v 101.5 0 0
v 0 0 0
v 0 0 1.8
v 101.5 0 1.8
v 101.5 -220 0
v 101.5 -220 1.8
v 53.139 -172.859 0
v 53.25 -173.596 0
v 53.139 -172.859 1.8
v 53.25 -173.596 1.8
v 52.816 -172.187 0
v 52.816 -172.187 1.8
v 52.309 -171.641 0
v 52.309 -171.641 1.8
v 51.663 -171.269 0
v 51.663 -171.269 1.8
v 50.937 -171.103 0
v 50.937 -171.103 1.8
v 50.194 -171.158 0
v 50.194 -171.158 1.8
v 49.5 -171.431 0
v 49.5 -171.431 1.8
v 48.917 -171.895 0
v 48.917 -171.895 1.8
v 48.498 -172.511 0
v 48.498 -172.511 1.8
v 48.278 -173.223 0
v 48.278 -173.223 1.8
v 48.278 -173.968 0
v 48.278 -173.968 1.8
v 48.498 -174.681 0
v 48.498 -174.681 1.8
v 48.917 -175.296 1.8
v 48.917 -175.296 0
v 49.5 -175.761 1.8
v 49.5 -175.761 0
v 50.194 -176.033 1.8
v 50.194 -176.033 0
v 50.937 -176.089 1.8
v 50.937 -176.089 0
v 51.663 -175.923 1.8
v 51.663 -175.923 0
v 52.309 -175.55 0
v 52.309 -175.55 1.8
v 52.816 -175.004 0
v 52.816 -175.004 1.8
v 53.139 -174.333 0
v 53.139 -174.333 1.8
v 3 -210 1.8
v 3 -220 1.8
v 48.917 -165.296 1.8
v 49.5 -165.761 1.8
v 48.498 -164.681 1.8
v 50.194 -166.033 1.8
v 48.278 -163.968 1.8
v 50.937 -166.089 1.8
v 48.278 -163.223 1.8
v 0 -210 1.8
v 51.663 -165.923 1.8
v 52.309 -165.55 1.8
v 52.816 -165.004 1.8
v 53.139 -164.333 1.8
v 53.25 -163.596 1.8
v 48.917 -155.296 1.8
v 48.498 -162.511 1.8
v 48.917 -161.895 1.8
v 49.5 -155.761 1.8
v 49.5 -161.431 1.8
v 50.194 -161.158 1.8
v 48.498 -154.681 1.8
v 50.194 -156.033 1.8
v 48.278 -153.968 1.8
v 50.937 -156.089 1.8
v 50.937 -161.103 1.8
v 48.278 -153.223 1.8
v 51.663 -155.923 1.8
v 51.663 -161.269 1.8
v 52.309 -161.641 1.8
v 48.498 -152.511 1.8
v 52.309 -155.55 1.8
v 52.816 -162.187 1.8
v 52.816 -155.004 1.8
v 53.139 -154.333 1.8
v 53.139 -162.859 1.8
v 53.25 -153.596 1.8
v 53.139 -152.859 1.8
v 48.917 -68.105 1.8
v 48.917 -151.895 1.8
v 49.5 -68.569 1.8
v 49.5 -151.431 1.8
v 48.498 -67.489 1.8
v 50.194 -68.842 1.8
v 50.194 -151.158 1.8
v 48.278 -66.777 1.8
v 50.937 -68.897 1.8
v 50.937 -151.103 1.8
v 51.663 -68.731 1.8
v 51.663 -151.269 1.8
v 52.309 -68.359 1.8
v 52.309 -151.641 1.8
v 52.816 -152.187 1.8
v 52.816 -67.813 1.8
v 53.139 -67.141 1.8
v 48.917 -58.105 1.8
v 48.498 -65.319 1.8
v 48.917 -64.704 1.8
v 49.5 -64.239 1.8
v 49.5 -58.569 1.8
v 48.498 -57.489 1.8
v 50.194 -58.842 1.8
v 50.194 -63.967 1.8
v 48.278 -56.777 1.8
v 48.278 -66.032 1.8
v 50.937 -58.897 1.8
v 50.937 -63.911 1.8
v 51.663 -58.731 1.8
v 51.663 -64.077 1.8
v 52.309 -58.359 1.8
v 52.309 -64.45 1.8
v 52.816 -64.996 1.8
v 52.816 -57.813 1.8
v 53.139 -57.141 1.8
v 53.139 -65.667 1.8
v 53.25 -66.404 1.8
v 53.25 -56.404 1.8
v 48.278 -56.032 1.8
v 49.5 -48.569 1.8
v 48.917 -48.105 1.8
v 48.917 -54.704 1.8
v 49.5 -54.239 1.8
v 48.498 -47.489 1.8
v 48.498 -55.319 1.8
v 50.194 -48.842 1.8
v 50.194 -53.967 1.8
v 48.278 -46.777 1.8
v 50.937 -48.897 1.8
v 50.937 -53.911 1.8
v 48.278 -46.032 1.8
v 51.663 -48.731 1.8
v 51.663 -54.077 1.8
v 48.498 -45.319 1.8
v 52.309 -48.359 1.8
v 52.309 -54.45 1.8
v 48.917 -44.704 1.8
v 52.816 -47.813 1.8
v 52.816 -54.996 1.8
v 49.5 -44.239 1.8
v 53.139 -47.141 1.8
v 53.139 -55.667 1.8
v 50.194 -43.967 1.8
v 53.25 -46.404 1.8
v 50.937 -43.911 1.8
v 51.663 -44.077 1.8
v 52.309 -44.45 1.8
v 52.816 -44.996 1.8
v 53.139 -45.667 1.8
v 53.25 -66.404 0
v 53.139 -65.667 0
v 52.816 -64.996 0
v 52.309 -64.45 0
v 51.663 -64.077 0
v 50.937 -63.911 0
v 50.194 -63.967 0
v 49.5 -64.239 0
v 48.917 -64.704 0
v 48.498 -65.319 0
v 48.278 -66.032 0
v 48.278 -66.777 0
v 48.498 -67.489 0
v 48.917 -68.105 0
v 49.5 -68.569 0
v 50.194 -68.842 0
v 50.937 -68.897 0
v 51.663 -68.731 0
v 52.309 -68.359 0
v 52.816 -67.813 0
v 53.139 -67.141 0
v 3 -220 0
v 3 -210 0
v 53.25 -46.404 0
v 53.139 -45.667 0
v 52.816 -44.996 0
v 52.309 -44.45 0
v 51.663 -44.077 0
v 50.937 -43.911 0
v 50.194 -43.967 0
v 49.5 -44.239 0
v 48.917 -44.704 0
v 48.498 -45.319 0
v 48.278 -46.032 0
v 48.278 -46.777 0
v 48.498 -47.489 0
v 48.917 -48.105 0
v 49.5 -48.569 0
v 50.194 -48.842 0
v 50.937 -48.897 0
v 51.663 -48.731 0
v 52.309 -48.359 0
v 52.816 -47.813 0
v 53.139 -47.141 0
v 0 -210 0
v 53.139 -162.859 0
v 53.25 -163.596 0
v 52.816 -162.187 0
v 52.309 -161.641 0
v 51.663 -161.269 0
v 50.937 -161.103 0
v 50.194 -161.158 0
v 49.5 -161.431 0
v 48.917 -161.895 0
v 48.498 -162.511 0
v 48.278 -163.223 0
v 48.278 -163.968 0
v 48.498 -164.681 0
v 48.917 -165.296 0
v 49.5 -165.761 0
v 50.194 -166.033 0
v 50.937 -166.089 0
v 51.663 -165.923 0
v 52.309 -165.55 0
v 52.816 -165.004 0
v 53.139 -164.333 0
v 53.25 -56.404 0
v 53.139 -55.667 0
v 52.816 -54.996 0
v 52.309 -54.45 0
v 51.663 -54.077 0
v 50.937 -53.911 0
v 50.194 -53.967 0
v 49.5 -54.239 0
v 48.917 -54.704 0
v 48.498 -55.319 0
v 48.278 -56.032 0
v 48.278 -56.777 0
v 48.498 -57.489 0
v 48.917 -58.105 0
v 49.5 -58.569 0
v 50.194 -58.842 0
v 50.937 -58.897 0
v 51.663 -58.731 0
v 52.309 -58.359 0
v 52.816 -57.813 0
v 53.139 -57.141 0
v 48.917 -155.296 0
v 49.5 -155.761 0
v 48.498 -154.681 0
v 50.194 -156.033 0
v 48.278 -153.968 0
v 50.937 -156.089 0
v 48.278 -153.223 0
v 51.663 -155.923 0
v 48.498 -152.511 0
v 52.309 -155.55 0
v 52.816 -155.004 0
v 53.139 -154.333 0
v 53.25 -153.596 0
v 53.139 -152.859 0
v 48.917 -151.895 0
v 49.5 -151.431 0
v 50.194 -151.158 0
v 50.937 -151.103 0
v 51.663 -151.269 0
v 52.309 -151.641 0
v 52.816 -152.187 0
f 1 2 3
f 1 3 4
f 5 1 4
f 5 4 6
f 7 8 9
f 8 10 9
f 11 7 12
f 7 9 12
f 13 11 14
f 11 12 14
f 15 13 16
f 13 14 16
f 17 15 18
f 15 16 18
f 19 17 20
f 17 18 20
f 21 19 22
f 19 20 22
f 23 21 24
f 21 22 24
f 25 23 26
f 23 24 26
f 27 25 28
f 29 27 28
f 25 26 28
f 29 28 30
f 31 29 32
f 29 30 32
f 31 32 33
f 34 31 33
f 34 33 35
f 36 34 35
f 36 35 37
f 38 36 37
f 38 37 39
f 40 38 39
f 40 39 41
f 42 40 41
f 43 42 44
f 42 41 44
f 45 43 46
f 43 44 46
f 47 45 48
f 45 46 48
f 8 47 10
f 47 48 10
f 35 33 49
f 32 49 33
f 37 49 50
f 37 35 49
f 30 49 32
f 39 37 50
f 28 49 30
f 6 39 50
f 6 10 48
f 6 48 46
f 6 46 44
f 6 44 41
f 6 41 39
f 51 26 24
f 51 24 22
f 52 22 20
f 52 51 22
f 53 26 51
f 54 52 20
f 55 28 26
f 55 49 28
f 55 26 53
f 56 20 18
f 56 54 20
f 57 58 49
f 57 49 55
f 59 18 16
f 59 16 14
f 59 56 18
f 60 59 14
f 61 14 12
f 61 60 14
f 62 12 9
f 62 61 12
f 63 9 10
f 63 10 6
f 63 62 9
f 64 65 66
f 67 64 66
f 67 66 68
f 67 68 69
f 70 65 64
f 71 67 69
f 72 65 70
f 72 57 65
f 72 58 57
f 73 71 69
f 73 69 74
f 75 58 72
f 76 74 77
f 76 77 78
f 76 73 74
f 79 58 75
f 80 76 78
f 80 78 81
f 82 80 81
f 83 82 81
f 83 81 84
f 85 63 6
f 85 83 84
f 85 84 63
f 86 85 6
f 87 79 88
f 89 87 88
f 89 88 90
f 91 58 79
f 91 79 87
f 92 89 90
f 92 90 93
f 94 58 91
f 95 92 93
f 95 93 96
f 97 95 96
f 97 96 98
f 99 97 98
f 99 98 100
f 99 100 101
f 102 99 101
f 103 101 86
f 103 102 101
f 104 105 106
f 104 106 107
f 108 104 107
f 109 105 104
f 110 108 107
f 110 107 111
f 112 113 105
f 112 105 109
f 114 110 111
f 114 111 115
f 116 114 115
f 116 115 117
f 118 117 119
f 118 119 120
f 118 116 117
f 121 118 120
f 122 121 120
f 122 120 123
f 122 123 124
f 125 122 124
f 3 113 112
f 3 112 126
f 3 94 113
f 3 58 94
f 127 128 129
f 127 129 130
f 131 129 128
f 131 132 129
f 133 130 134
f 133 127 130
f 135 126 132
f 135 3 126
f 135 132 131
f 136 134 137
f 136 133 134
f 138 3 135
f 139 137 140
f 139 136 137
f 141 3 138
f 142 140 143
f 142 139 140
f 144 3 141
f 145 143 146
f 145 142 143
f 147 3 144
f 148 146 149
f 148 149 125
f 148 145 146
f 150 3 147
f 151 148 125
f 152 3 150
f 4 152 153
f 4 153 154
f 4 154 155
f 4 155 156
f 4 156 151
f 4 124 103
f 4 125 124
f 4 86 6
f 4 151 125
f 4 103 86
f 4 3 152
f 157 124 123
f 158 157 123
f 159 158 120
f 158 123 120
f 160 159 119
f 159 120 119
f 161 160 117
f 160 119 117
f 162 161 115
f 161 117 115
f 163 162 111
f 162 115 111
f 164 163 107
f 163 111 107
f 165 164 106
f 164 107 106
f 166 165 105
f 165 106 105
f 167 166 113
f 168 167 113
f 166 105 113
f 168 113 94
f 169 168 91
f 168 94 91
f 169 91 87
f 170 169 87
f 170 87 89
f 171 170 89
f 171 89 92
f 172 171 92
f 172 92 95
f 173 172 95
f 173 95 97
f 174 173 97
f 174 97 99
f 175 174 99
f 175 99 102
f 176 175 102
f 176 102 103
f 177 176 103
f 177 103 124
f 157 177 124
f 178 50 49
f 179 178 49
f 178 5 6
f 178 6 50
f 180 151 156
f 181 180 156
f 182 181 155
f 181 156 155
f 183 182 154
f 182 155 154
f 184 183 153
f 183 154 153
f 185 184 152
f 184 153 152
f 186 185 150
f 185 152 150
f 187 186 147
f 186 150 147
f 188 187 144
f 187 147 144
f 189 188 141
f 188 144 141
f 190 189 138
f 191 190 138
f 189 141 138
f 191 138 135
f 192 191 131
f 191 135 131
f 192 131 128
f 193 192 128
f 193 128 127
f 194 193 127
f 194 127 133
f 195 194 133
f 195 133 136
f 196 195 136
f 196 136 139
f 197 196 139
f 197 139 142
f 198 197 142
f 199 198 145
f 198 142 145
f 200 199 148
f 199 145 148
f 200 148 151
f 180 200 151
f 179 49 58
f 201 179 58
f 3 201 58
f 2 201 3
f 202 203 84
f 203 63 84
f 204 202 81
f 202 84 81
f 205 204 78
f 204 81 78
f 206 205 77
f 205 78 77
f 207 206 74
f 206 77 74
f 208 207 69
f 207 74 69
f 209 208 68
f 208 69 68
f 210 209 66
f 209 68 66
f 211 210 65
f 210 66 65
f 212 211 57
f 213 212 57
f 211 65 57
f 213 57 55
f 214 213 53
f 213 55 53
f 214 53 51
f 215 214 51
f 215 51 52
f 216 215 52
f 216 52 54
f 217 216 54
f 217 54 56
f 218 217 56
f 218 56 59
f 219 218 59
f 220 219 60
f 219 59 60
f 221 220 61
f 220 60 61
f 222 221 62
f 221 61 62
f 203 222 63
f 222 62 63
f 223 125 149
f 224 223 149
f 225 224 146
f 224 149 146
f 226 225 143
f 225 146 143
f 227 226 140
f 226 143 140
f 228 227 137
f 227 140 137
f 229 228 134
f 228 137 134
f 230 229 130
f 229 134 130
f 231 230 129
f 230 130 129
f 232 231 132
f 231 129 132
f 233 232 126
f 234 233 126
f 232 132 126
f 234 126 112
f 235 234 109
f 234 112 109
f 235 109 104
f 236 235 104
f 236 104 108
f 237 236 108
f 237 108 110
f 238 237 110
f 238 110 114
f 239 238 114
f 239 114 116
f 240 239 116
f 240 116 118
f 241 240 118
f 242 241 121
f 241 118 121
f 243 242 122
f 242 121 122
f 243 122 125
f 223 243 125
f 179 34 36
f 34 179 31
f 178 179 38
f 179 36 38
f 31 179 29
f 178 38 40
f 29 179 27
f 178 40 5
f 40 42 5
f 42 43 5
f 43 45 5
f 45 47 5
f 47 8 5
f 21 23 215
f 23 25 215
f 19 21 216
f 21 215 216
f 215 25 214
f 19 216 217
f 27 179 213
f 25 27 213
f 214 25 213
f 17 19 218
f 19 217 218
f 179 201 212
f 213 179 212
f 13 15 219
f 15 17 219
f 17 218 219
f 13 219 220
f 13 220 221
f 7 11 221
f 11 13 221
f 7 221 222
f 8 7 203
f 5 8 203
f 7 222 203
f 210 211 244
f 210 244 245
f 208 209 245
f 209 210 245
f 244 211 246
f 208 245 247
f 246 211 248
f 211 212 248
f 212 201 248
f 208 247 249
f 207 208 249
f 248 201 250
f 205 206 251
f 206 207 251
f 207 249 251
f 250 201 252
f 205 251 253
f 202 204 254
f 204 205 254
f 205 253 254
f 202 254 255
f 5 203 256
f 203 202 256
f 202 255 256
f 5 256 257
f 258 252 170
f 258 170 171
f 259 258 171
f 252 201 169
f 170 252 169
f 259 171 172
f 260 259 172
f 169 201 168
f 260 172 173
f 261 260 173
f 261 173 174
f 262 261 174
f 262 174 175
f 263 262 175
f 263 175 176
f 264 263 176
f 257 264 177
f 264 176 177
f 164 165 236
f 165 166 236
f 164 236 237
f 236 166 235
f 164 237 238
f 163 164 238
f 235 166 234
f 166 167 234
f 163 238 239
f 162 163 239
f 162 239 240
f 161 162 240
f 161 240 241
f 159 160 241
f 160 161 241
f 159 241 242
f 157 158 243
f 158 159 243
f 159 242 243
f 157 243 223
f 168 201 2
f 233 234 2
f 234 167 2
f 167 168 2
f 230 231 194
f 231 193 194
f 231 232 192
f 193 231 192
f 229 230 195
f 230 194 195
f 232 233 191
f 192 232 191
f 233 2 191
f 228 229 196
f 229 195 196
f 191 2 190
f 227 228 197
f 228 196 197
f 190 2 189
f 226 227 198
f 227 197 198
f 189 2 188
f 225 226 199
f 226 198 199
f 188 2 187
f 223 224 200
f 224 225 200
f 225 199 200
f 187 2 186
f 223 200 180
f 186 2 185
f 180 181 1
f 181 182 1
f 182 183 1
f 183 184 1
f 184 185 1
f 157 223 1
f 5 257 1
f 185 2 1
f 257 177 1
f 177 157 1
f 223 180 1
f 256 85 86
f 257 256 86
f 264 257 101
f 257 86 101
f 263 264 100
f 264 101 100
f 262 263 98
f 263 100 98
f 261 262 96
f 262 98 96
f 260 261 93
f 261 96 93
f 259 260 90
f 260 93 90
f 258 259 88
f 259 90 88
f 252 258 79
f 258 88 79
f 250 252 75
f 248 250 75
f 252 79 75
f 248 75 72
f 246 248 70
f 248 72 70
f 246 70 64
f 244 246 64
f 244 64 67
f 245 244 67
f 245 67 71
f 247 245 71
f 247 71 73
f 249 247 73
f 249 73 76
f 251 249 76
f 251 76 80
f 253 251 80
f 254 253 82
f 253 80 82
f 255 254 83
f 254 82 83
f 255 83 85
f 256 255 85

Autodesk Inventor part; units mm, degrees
ref_plane "YZ Plane" through (0, 0, 0) normal (1, 0, 0) x (0, 1, 0)
ref_plane "XZ Plane" through (0, 0, 0) normal (0, 1, 0) x (-1, 0, 0)
ref_plane "XY Plane" through (0, 0, 0) normal (0, 0, 1) x (1, 0, 0)
sketch "Sketch1" plane through (0, 0, 0) normal (0, 0, 1) x (1, 0, 0)
  line L0 (0, 0) -> (101.5, 0)
  line L1 (101.5, 0) -> (101.5, -220)
  line L2 (101.5, -220) -> (0, -220)
  line L3 (0, -220) -> (0, 0)
  dimension "d0" = 101.5
  dimension "d1" = 220
extrude "Extrusion1" add sketch "Sketch1" along normal blind 1.8
sketch "Sketch2" plane through (0, 0, 1.8) normal (0, 0, 1) x (1, 0, 0)
  line L0 (0, 0) -> (0, -220) projected
  line L1 (101.5, -220) -> (101.5, 0) projected
  line L2 (0, 0) -> (101.5, 0)
  line L3 (101.5, 0) -> (101.5, -10)
  line L4 (101.5, -10) -> (0, -10)
  line L5 (0, -10) -> (0, 0)
  line L6 (50.75, -10) -> (140.75, -10)
  line L7 (140.75, -10) -> (140.75, -153.5958)
  line L8 (140.75, -153.5958) -> (50.75, -153.5958)
  line L9 (50.75, -153.5958) -> (50.75, -10)
  circle A0 centre (50.75, -153.5958) radius 2.5
  line L10 (50.75, -153.5958) -> (50.75, -173.5958)
  circle A1 centre (50.75, -173.5958) radius 2.5
  line L11 (50.75, -153.5958) -> (50.75, -133.5958)
  circle A2 centre (50.75, -163.5958) radius 2.5
  line L12 (101.5, 0) -> (0, 0) projected
  line L13 (0, -220) -> (101.5, -220) projected
  line L14 (0, 0) -> (101.5, -220)
  line L15 (101.5, -220) -> (50.75, -110)
  line L16 (50.75, -110) -> (87.135, -110)
  circle A3 centre (50.75, -66.4042) radius 2.5
  line L17 (50.75, -113.5958) -> (50.75, -46.4042)
  circle A4 centre (50.75, -46.4042) radius 2.5
  line L18 (50.75, -113.5958) -> (50.75, -86.4042)
  circle A5 centre (50.75, -56.4042) radius 2.5
  dimension "d4" = 10
  dimension "d5" = 90
  dimension "d6" = 5
  dimension "d7" = 20
  dimension "d8" = 20
  dimension "d11" = 5
extrude "Extrusion2" cut sketch "Sketch2" against normal blind 10 contours A1 | A2 L10 | L10 A2 | A4 L9 | L9 A4 | A3 L9 | L9 A3 | A0 L10 L8 | L8 L9 A0 | A5 L9 | L9 A5 | L9 L10 A0
sketch "Sketch3" plane through (0, 0, 1.8) normal (0, 0, 1) x (1, 0, 0)
  line L0 (0, -220) -> (101.5, -220) projected
  line L1 (0, -220) -> (3, -220)
  line L2 (3, -220) -> (3, -210)
  line L3 (3, -210) -> (0, -210)
  line L4 (0, -210) -> (0, -220)
  point P0 (0, 0)
  dimension "d14" = 3
  dimension "d15" = 10
extrude "Extrusion3" cut sketch "Sketch3" against normal blind 10
properties part number "7001_Aluminum_Chasis_Coil_Assembly_Separator_Tx_Filter_MPSv2_v1" material "Aluminum 6061"
